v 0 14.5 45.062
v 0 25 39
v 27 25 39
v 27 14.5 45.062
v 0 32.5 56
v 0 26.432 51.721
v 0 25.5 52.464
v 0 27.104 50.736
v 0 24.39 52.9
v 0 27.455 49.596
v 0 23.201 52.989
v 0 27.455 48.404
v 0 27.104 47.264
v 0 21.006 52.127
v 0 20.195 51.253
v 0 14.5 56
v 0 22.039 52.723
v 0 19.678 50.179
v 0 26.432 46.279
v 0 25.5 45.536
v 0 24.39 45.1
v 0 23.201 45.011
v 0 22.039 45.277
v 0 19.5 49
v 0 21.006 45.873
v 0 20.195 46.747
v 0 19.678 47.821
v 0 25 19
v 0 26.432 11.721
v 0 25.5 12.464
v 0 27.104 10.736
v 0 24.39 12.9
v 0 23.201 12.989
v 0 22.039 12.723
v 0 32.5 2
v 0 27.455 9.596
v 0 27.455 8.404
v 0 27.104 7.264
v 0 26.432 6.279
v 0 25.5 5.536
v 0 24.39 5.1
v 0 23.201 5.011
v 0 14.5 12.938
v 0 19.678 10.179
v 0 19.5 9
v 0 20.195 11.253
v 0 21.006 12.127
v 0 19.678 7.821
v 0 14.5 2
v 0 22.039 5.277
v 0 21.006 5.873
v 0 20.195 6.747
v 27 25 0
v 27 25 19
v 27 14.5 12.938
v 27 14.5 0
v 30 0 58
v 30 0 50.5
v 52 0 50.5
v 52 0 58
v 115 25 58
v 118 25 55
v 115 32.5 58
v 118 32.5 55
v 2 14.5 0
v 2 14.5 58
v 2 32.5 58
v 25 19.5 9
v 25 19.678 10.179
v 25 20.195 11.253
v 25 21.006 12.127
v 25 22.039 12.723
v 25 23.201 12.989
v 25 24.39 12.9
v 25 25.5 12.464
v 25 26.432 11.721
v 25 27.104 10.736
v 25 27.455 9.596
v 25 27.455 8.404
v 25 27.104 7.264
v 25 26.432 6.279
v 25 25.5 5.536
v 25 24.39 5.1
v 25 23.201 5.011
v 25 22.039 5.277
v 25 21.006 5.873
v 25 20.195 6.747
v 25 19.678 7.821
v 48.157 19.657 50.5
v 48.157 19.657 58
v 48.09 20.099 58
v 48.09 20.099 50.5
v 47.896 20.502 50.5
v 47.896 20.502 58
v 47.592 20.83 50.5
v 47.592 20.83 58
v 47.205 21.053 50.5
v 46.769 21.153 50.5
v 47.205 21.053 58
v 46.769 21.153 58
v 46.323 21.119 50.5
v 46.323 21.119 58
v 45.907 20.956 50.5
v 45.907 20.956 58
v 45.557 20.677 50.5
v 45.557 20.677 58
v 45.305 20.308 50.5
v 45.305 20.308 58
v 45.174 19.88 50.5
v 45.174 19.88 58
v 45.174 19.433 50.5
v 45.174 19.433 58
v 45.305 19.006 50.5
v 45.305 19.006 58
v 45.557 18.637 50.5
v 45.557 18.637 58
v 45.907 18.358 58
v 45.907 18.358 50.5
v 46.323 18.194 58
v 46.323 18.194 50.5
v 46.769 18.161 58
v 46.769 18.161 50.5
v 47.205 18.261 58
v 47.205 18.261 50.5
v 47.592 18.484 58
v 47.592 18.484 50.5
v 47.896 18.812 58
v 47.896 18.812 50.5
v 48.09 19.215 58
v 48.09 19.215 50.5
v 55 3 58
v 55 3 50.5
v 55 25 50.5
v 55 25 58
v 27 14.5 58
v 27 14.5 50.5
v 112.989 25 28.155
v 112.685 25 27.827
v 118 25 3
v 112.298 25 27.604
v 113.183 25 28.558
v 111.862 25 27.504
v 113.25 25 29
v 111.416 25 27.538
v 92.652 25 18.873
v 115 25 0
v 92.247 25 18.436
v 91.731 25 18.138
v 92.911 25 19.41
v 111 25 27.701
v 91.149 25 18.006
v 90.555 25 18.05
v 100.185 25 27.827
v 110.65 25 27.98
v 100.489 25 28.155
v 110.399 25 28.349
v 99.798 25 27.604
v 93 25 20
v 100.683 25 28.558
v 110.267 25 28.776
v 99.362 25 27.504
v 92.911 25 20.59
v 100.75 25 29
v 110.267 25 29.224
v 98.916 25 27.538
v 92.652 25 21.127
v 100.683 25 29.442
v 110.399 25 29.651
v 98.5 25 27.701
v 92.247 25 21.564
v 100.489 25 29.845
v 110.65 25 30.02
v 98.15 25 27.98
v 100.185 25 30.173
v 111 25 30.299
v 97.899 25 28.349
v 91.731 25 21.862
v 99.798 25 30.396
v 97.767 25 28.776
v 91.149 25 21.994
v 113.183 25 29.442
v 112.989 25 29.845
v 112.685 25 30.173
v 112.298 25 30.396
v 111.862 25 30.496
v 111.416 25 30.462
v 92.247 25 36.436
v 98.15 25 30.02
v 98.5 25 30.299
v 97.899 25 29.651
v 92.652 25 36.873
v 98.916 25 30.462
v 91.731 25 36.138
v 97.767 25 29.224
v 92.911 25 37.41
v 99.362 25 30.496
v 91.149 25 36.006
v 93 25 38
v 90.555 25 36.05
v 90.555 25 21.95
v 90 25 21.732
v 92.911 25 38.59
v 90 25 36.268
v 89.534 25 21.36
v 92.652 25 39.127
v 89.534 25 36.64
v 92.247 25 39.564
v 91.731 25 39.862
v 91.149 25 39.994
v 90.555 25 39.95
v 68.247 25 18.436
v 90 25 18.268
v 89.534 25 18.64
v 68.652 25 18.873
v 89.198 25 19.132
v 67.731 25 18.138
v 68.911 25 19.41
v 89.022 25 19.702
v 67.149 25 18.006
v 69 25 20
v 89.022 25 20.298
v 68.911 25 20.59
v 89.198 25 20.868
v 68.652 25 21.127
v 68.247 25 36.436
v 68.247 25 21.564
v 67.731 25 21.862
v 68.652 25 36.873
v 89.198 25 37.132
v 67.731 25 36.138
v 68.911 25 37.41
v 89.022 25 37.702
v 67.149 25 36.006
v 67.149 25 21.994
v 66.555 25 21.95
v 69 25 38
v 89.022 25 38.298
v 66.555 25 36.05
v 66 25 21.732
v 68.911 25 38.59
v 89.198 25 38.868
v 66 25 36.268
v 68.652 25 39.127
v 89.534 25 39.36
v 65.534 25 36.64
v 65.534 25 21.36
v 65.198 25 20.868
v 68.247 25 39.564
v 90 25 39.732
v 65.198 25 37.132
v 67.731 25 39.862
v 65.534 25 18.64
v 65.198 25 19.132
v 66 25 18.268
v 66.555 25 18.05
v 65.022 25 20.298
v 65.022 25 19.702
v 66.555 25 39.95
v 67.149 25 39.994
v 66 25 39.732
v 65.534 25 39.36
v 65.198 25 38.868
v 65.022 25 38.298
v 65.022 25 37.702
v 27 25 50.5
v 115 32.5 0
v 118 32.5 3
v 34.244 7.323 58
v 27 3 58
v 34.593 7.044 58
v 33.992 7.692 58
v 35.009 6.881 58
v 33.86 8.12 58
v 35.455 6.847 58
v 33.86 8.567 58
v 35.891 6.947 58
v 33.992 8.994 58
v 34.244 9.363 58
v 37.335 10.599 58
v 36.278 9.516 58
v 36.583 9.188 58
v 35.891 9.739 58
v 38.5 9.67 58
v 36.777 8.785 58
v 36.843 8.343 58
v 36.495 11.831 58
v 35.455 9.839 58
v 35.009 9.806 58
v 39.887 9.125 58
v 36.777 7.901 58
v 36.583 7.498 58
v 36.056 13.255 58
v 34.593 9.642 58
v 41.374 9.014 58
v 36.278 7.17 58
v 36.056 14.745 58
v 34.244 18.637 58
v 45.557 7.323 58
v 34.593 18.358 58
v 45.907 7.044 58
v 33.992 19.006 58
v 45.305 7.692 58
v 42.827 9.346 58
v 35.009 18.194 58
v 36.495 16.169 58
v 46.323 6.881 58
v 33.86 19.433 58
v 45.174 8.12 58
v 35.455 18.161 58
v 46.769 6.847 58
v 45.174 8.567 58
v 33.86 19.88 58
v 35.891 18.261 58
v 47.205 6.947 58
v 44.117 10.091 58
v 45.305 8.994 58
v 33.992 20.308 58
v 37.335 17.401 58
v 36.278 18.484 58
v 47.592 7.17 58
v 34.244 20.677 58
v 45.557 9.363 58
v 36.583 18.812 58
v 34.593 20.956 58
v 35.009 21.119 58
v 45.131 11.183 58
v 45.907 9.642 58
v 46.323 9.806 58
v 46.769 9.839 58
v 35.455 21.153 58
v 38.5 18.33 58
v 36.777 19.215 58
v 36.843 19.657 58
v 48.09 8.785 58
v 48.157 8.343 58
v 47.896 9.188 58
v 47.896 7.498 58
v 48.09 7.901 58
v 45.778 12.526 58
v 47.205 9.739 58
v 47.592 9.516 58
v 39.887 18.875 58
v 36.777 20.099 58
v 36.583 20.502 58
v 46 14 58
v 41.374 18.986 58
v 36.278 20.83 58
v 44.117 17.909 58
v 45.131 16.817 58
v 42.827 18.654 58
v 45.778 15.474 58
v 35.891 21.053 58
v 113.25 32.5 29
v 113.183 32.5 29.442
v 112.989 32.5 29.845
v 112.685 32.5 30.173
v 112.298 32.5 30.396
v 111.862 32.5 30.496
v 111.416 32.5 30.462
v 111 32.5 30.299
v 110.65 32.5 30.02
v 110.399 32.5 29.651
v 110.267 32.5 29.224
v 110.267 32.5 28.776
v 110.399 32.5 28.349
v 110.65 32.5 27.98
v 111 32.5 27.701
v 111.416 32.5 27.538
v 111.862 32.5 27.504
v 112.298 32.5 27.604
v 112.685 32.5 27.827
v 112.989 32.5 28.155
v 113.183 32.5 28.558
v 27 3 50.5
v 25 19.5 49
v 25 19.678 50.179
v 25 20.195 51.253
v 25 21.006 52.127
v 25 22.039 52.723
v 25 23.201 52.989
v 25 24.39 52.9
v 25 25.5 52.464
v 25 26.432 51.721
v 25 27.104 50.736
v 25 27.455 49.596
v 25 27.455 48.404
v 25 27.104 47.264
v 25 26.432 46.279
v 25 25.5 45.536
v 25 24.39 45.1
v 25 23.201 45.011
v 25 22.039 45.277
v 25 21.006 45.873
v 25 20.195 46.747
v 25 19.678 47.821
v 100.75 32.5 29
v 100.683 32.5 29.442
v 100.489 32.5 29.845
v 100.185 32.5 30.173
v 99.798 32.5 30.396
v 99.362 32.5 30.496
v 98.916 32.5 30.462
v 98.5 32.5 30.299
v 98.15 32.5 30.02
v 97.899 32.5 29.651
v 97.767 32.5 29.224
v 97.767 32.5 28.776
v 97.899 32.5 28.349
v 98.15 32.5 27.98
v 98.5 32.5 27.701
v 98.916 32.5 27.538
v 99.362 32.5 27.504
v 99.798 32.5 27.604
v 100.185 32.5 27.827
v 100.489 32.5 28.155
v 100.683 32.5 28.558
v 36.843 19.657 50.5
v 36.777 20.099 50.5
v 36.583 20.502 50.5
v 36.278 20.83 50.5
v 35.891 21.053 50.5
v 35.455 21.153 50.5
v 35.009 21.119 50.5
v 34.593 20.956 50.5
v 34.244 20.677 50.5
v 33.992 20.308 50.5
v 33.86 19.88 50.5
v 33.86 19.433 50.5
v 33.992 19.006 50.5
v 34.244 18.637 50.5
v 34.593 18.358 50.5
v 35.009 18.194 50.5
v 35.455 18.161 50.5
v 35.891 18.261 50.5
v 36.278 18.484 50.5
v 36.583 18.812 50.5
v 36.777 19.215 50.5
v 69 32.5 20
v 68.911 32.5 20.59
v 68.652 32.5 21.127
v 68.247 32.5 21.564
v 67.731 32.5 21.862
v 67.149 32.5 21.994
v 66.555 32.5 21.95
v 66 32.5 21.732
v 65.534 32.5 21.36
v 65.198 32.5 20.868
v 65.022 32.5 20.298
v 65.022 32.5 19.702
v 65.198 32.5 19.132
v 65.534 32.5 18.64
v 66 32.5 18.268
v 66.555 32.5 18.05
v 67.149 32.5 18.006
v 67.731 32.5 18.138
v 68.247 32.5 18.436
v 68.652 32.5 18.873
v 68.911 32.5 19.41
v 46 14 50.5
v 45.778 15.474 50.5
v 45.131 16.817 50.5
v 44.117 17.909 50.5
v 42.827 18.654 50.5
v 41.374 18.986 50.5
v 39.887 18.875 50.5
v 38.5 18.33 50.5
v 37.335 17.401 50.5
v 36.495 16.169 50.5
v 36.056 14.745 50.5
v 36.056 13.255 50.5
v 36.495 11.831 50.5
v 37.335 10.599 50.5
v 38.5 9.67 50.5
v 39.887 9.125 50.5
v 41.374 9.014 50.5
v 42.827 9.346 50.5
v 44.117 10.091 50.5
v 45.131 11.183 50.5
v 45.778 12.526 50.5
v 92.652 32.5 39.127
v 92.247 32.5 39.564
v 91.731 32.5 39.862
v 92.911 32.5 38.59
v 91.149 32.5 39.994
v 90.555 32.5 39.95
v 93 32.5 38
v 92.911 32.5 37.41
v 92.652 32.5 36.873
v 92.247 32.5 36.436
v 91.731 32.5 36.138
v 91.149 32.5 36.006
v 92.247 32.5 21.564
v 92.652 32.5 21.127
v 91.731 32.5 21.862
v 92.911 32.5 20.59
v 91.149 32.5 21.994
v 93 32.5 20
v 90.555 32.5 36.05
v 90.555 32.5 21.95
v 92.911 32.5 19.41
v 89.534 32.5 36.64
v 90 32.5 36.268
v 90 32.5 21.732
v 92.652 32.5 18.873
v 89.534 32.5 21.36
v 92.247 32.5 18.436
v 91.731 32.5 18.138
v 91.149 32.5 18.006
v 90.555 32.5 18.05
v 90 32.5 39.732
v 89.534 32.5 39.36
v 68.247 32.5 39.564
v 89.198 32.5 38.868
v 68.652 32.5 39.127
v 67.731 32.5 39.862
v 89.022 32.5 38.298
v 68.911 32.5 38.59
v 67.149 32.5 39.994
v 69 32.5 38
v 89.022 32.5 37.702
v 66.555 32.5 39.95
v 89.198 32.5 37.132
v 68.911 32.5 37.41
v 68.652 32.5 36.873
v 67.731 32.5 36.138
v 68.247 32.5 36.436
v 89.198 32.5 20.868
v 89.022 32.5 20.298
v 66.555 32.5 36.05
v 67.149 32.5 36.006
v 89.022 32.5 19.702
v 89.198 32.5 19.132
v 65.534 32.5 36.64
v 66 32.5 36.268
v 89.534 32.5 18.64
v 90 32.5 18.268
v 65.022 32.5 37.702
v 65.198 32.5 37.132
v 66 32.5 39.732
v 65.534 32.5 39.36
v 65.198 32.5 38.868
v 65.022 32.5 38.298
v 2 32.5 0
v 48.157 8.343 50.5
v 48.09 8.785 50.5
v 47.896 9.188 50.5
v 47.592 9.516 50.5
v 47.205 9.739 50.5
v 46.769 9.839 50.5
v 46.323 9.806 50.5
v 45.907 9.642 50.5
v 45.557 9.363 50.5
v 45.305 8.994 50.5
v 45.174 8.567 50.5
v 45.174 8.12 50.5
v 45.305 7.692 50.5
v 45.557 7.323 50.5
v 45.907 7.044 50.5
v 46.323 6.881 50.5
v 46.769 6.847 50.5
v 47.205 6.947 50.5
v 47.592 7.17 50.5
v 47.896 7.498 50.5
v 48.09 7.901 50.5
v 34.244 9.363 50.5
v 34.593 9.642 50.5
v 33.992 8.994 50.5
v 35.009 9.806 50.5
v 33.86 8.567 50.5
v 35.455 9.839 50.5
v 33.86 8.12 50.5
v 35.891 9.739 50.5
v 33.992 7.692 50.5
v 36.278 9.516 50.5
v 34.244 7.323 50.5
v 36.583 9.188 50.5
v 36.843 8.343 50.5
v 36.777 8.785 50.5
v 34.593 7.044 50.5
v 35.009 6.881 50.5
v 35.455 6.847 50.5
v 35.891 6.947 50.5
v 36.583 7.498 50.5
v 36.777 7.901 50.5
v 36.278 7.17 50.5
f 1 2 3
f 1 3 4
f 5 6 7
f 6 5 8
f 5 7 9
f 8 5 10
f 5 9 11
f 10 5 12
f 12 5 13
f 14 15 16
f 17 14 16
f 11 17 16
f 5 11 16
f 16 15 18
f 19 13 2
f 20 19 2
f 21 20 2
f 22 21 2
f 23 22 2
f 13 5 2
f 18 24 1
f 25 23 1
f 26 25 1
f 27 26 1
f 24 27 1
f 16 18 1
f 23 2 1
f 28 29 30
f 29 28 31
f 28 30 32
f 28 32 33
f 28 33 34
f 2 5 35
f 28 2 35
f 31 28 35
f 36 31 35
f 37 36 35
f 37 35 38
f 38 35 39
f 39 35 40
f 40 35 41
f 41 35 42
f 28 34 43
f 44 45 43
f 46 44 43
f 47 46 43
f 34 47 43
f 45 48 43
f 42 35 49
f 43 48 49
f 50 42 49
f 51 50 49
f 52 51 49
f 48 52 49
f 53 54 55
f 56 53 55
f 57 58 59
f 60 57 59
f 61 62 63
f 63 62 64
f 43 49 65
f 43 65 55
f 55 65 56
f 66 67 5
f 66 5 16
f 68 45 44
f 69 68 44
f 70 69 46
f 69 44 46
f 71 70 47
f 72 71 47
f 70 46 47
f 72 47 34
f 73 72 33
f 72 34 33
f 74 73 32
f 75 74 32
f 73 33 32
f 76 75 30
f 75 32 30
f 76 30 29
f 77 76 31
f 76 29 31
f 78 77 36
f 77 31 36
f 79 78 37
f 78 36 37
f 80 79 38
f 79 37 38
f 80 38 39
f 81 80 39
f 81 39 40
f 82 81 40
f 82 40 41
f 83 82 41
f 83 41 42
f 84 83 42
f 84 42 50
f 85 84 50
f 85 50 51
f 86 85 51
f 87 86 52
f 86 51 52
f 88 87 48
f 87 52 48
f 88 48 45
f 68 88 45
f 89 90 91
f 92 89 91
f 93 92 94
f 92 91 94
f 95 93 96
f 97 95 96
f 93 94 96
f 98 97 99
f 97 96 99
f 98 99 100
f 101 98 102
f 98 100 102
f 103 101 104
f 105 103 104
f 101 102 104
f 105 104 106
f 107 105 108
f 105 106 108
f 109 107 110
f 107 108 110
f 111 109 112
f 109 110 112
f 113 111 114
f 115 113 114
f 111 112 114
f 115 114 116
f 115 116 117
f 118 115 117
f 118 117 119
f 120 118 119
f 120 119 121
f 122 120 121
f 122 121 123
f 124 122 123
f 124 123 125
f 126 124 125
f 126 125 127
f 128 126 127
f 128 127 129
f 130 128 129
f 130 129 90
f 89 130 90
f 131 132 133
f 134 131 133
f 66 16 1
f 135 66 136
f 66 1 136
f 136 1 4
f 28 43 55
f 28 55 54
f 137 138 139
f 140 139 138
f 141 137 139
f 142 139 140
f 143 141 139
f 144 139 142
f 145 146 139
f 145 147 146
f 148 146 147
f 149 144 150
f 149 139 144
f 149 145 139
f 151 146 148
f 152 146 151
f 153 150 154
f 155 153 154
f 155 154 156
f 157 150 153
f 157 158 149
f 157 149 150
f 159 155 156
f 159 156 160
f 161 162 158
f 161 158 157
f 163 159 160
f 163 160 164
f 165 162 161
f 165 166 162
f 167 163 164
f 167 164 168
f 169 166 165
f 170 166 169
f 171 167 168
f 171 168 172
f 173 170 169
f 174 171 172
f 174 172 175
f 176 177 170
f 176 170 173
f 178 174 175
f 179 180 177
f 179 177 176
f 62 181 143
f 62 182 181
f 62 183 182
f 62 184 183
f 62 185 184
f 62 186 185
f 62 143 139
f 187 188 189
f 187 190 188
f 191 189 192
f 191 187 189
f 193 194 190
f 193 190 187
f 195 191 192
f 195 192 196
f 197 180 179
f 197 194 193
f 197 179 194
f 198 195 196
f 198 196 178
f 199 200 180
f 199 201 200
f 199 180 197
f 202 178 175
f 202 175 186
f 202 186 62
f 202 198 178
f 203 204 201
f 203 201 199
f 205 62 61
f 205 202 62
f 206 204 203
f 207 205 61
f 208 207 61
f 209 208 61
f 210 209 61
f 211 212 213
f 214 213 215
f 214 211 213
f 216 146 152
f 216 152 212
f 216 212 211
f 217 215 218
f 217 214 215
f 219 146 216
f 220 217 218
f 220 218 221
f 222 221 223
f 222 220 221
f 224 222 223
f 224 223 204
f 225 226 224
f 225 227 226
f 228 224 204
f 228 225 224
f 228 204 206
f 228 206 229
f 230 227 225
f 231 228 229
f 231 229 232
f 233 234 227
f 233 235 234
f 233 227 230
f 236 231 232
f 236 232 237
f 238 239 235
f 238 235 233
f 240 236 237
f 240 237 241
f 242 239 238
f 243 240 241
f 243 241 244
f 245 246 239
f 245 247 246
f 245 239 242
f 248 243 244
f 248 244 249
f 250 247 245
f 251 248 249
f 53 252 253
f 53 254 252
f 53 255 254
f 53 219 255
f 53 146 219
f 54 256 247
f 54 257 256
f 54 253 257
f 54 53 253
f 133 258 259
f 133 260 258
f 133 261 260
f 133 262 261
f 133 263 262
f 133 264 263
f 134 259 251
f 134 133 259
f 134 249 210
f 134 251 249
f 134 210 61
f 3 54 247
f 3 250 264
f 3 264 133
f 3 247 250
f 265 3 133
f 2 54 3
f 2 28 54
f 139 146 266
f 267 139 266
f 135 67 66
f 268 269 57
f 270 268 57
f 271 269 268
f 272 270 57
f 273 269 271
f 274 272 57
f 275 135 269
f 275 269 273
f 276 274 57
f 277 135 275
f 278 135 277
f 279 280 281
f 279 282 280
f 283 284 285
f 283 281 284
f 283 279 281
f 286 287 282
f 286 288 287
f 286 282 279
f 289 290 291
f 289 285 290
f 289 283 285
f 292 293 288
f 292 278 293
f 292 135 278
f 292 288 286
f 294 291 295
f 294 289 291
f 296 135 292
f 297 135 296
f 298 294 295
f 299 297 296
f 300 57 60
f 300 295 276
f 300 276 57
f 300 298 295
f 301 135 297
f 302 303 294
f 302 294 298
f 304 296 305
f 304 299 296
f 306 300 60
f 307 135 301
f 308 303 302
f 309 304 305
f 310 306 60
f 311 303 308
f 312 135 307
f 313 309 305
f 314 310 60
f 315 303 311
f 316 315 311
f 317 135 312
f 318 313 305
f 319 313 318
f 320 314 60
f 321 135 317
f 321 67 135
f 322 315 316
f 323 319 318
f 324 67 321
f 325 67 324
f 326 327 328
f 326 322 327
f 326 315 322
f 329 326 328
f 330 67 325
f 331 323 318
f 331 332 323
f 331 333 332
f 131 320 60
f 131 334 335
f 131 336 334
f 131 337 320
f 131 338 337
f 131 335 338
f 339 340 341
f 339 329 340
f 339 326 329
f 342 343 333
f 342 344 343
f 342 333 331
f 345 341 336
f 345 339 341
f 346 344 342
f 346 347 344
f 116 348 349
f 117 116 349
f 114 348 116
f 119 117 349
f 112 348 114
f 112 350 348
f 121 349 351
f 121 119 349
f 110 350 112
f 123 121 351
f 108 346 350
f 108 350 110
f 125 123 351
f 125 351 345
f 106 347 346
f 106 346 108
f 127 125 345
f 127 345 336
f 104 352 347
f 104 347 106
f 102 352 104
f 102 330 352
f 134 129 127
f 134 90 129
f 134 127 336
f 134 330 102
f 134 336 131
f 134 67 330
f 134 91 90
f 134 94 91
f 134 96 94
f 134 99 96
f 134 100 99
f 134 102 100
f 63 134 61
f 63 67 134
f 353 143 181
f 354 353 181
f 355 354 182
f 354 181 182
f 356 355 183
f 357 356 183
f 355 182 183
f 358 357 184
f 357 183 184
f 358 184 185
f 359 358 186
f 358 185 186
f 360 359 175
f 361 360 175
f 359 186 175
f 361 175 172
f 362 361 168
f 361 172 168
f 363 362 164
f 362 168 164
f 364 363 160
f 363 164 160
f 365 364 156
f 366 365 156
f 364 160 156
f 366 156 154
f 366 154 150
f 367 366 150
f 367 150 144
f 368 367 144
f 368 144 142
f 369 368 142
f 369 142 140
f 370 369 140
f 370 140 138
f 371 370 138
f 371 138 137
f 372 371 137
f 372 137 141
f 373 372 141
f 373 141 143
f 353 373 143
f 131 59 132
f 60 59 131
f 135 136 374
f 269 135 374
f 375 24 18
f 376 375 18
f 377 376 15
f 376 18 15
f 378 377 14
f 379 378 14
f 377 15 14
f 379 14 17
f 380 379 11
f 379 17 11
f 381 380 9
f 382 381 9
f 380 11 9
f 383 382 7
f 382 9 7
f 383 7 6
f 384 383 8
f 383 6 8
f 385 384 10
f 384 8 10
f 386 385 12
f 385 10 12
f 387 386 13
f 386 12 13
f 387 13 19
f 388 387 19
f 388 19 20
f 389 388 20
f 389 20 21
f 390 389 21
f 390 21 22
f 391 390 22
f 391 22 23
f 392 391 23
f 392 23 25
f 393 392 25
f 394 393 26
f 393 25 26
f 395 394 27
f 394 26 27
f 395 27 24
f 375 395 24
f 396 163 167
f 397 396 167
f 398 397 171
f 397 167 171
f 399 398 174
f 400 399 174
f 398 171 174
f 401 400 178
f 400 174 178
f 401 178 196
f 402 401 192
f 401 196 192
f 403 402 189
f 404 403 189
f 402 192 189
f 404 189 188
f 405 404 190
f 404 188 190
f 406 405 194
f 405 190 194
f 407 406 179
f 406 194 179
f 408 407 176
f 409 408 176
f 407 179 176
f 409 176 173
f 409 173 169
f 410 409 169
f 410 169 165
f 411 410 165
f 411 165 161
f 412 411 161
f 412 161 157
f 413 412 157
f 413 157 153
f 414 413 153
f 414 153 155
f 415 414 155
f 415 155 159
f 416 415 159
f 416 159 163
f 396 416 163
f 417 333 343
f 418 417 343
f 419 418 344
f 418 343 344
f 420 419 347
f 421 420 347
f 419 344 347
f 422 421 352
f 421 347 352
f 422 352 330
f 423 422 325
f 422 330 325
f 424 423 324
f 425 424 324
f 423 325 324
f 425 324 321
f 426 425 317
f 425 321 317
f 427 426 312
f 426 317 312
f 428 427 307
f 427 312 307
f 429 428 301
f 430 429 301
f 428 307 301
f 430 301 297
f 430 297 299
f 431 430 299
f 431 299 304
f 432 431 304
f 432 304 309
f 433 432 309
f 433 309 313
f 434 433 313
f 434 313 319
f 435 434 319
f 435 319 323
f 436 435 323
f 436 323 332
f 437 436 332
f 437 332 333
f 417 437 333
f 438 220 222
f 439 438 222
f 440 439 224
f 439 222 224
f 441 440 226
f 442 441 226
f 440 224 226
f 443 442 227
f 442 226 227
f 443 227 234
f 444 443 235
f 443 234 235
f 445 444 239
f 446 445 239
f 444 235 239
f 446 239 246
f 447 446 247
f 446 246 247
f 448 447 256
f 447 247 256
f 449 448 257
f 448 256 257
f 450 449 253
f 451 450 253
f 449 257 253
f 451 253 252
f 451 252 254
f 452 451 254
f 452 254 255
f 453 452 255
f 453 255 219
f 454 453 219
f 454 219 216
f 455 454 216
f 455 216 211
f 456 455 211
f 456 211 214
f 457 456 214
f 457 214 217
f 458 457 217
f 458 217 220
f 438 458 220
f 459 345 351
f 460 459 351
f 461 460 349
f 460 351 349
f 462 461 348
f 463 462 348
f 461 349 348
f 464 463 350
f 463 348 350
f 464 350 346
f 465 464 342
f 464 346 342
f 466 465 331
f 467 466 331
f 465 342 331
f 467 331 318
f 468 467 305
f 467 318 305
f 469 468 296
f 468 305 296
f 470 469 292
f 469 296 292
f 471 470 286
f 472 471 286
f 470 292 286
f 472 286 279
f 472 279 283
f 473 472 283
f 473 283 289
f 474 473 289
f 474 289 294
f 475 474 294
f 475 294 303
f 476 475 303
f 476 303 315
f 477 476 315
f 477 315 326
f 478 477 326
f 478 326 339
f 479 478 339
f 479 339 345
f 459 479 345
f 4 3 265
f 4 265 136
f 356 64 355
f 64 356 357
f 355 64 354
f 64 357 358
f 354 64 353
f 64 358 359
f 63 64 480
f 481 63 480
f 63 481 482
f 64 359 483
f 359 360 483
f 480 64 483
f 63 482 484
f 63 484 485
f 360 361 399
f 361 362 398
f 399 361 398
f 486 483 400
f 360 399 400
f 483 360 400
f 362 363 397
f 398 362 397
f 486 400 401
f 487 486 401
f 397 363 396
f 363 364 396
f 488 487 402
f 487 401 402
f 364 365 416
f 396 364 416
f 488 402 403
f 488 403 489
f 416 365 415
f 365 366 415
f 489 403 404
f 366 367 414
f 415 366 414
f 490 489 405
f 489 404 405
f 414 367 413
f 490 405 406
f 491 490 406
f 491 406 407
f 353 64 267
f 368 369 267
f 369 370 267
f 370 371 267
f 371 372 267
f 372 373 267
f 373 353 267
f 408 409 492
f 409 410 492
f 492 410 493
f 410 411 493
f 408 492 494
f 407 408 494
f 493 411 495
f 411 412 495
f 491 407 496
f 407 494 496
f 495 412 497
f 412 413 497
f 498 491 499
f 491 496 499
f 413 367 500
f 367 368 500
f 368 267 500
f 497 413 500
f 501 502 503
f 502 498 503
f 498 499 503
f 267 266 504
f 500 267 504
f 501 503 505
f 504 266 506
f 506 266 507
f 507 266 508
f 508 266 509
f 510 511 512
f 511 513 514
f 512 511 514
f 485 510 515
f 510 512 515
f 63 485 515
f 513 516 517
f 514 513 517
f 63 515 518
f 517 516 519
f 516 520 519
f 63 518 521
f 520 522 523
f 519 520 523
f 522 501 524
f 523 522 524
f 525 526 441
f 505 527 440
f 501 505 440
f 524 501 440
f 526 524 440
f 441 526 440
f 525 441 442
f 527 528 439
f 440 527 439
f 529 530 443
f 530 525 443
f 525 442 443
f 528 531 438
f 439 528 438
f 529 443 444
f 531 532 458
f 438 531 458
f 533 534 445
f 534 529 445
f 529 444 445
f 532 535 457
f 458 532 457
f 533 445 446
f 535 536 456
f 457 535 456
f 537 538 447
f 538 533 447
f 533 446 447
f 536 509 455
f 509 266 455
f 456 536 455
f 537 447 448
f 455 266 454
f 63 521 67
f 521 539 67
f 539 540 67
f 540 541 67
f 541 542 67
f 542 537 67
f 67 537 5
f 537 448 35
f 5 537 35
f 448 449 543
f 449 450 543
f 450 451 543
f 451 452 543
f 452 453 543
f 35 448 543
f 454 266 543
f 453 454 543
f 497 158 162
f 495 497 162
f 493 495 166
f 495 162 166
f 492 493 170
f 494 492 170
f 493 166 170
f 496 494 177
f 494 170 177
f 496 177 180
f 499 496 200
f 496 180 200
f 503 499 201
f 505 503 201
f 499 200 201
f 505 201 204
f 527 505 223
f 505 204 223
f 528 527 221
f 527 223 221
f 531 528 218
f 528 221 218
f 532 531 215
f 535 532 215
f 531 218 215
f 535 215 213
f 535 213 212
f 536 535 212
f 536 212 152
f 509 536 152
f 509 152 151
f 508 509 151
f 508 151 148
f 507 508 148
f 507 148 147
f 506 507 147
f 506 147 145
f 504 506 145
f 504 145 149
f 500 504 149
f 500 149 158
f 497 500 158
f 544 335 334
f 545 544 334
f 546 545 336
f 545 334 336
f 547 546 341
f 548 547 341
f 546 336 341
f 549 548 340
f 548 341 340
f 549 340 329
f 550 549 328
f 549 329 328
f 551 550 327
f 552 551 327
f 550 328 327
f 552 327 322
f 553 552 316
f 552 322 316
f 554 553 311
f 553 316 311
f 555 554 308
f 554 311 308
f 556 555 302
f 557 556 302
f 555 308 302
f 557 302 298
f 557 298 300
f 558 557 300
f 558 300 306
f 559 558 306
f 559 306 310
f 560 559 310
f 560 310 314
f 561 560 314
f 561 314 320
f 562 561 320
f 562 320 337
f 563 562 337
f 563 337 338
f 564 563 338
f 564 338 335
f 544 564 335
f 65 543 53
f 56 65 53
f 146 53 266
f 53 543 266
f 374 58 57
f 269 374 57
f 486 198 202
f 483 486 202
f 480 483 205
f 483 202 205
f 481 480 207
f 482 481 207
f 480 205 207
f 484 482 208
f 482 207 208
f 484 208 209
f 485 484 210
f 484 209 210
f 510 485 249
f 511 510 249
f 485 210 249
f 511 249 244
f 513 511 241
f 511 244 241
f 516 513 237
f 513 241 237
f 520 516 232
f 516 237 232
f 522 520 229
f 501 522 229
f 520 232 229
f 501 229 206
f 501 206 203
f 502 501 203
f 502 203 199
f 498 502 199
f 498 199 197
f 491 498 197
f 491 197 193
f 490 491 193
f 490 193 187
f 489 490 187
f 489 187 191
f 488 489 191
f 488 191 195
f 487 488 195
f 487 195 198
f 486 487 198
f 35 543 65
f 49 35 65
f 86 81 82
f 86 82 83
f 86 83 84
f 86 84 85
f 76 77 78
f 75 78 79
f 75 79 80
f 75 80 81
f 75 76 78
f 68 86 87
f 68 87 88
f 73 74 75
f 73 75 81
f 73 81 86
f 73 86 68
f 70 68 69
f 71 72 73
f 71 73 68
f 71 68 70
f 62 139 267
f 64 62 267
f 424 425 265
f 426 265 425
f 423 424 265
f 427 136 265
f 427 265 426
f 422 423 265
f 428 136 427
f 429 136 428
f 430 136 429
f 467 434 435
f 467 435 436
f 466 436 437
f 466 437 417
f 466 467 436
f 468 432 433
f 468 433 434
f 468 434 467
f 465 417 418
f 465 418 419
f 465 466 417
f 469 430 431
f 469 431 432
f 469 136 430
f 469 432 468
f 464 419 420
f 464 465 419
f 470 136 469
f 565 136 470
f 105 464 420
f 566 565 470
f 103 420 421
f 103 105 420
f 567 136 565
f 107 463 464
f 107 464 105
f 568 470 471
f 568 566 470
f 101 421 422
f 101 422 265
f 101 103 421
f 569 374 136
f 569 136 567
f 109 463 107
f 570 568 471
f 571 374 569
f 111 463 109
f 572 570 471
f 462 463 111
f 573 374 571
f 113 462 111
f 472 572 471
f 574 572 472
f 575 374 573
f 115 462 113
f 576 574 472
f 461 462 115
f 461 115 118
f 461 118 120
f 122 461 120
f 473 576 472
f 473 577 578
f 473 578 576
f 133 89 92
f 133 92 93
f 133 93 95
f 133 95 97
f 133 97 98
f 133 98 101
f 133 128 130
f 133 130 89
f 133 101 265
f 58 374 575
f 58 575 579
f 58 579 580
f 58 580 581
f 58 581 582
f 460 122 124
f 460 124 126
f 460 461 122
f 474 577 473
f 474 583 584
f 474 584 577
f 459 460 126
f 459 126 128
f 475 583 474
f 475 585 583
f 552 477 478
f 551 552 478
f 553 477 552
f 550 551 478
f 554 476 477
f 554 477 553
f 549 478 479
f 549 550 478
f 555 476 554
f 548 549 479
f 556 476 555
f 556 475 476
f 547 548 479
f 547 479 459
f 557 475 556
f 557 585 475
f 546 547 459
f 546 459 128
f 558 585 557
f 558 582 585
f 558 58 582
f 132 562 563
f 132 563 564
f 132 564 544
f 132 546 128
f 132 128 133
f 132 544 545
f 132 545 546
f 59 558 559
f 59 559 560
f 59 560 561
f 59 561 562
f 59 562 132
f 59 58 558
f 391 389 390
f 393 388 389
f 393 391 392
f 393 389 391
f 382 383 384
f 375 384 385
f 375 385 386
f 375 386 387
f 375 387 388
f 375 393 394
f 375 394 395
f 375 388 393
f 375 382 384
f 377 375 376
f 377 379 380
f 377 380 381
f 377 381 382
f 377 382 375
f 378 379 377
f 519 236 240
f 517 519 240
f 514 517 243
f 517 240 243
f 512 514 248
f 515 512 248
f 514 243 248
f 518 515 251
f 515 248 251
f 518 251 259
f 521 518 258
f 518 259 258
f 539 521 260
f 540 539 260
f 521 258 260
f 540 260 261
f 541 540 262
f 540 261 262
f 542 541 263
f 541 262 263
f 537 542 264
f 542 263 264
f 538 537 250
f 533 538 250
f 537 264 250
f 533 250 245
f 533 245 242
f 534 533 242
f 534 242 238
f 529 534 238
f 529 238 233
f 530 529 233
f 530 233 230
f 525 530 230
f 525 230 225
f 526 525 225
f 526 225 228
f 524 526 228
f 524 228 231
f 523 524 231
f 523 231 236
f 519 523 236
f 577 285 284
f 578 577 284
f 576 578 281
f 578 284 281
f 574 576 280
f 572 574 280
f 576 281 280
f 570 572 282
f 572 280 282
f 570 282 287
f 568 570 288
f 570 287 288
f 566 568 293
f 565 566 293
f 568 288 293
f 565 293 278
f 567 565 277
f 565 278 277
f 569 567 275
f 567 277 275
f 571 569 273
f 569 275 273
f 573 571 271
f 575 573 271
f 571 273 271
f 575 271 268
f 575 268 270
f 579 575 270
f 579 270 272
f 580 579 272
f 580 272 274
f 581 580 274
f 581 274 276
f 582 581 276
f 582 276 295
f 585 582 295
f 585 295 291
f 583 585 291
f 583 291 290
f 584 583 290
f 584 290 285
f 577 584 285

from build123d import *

# Parameters (mm, degrees)
PAD_DEPTH       = 58
SKETCH001_R     = 4
POCKET_DEPTH    = 25
SKETCH002_W     = 28
SKETCH002_H     = 25
POCKET001_DEPTH = 50.5
SKETCH003_R     = 5
SKETCH003_R_2   = 1.5
POCKET002_DEPTH = 58.001
POCKET003_DEPTH = 27
SKETCH005_R     = 2
SKETCH005_R_2   = 1.5
POCKET004_DEPTH = 7.501
CHAMFER_SIZE    = 2
CHAMFER001_SIZE = 3
CHAMFER002_SIZE = 3


with BuildPart() as part:
    # Sketch → Pad (new body)
    with BuildSketch(Plane.XY):
        Polygon((0, 32.5), (0, 14.5), (27, 14.5), (27, 0), (55, 0), (55, 25), (118, 25), (118, 32.5), align=None)
    extrude(amount=PAD_DEPTH)

    # Sketch001 (on Face1 of Pad) → Pocket (cut)
    with BuildSketch(Plane(origin=(0, 0, 0), x_dir=(0, -1, 0), z_dir=(-1, 0, 0))):
        with Locations((-23.5, 49)):
            Circle(SKETCH001_R)
        with Locations((-23.5, 9)):
            Circle(SKETCH001_R)
    extrude(amount=-POCKET_DEPTH, mode=Mode.SUBTRACT)

    # Sketch002 (on Face3 of Pocket) → Pocket001 (cut)
    with BuildSketch(Plane(origin=(0, 0, 0), x_dir=(1, 0, 0), z_dir=(0, 0, -1))):
        with Locations((41, -12.5)):
            Rectangle(SKETCH002_W, SKETCH002_H)
    extrude(amount=-POCKET001_DEPTH, mode=Mode.SUBTRACT)

    # Sketch003 (on Face4 of Pocket001) → Pocket002 (cut, through all)
    with BuildSketch(Plane.XY.offset(58)):
        with Locations((41, 14)):
            Circle(SKETCH003_R)
        with Locations((35.343146, 19.656854)):
            Circle(SKETCH003_R_2)
        with Locations((46.656854, 19.656854)):
            Circle(SKETCH003_R_2)
        with Locations((46.656854, 8.343146)):
            Circle(SKETCH003_R_2)
        with Locations((35.343146, 8.343146)):
            Circle(SKETCH003_R_2)
    extrude(amount=-POCKET002_DEPTH, mode=Mode.SUBTRACT)

    # Sketch004 (on Face1 of Pocket002) → Pocket003 (cut)
    with BuildSketch(Plane(origin=(0, 0, 0), x_dir=(0, -1, 0), z_dir=(-1, 0, 0))):
        Polygon((-14.5, 45.062178), (-14.5, 12.937822), (-25, 19), (-25, 39), align=None)
    extrude(amount=-POCKET003_DEPTH, mode=Mode.SUBTRACT)

    # Sketch005 (on Face13 of Pocket003) → Pocket004 (cut, through all)
    with BuildSketch(Plane.XZ.offset(-25)):
        with Locations((67, 38)):
            Circle(SKETCH005_R)
        with Locations((91, 38)):
            Circle(SKETCH005_R)
        with Locations((91, 20)):
            Circle(SKETCH005_R)
        with Locations((67, 20)):
            Circle(SKETCH005_R)
        with Locations((99.25, 29)):
            Circle(SKETCH005_R_2)
        with Locations((111.75, 29)):
            Circle(SKETCH005_R_2)
    extrude(amount=-POCKET004_DEPTH, mode=Mode.SUBTRACT)

    # Chamfer
    chamfer_edges = [part.edges().sort_by_distance(p)[0] for p in [
        (0, 23.5, 58),
        (0, 23.5, 0),
    ]]
    chamfer(chamfer_edges, length=CHAMFER_SIZE)

    # Chamfer001
    chamfer001_edges = [part.edges().sort_by_distance(p)[0] for p in [
        (27, 0, 54.25),
        (55, 0, 54.25),
    ]]
    chamfer(chamfer001_edges, length=CHAMFER001_SIZE)

    # Chamfer002
    chamfer002_edges = [part.edges().sort_by_distance(p)[0] for p in [
        (118, 28.75, 0),
        (118, 28.75, 58),
    ]]
    chamfer(chamfer002_edges, length=CHAMFER002_SIZE)


solid = part.part
